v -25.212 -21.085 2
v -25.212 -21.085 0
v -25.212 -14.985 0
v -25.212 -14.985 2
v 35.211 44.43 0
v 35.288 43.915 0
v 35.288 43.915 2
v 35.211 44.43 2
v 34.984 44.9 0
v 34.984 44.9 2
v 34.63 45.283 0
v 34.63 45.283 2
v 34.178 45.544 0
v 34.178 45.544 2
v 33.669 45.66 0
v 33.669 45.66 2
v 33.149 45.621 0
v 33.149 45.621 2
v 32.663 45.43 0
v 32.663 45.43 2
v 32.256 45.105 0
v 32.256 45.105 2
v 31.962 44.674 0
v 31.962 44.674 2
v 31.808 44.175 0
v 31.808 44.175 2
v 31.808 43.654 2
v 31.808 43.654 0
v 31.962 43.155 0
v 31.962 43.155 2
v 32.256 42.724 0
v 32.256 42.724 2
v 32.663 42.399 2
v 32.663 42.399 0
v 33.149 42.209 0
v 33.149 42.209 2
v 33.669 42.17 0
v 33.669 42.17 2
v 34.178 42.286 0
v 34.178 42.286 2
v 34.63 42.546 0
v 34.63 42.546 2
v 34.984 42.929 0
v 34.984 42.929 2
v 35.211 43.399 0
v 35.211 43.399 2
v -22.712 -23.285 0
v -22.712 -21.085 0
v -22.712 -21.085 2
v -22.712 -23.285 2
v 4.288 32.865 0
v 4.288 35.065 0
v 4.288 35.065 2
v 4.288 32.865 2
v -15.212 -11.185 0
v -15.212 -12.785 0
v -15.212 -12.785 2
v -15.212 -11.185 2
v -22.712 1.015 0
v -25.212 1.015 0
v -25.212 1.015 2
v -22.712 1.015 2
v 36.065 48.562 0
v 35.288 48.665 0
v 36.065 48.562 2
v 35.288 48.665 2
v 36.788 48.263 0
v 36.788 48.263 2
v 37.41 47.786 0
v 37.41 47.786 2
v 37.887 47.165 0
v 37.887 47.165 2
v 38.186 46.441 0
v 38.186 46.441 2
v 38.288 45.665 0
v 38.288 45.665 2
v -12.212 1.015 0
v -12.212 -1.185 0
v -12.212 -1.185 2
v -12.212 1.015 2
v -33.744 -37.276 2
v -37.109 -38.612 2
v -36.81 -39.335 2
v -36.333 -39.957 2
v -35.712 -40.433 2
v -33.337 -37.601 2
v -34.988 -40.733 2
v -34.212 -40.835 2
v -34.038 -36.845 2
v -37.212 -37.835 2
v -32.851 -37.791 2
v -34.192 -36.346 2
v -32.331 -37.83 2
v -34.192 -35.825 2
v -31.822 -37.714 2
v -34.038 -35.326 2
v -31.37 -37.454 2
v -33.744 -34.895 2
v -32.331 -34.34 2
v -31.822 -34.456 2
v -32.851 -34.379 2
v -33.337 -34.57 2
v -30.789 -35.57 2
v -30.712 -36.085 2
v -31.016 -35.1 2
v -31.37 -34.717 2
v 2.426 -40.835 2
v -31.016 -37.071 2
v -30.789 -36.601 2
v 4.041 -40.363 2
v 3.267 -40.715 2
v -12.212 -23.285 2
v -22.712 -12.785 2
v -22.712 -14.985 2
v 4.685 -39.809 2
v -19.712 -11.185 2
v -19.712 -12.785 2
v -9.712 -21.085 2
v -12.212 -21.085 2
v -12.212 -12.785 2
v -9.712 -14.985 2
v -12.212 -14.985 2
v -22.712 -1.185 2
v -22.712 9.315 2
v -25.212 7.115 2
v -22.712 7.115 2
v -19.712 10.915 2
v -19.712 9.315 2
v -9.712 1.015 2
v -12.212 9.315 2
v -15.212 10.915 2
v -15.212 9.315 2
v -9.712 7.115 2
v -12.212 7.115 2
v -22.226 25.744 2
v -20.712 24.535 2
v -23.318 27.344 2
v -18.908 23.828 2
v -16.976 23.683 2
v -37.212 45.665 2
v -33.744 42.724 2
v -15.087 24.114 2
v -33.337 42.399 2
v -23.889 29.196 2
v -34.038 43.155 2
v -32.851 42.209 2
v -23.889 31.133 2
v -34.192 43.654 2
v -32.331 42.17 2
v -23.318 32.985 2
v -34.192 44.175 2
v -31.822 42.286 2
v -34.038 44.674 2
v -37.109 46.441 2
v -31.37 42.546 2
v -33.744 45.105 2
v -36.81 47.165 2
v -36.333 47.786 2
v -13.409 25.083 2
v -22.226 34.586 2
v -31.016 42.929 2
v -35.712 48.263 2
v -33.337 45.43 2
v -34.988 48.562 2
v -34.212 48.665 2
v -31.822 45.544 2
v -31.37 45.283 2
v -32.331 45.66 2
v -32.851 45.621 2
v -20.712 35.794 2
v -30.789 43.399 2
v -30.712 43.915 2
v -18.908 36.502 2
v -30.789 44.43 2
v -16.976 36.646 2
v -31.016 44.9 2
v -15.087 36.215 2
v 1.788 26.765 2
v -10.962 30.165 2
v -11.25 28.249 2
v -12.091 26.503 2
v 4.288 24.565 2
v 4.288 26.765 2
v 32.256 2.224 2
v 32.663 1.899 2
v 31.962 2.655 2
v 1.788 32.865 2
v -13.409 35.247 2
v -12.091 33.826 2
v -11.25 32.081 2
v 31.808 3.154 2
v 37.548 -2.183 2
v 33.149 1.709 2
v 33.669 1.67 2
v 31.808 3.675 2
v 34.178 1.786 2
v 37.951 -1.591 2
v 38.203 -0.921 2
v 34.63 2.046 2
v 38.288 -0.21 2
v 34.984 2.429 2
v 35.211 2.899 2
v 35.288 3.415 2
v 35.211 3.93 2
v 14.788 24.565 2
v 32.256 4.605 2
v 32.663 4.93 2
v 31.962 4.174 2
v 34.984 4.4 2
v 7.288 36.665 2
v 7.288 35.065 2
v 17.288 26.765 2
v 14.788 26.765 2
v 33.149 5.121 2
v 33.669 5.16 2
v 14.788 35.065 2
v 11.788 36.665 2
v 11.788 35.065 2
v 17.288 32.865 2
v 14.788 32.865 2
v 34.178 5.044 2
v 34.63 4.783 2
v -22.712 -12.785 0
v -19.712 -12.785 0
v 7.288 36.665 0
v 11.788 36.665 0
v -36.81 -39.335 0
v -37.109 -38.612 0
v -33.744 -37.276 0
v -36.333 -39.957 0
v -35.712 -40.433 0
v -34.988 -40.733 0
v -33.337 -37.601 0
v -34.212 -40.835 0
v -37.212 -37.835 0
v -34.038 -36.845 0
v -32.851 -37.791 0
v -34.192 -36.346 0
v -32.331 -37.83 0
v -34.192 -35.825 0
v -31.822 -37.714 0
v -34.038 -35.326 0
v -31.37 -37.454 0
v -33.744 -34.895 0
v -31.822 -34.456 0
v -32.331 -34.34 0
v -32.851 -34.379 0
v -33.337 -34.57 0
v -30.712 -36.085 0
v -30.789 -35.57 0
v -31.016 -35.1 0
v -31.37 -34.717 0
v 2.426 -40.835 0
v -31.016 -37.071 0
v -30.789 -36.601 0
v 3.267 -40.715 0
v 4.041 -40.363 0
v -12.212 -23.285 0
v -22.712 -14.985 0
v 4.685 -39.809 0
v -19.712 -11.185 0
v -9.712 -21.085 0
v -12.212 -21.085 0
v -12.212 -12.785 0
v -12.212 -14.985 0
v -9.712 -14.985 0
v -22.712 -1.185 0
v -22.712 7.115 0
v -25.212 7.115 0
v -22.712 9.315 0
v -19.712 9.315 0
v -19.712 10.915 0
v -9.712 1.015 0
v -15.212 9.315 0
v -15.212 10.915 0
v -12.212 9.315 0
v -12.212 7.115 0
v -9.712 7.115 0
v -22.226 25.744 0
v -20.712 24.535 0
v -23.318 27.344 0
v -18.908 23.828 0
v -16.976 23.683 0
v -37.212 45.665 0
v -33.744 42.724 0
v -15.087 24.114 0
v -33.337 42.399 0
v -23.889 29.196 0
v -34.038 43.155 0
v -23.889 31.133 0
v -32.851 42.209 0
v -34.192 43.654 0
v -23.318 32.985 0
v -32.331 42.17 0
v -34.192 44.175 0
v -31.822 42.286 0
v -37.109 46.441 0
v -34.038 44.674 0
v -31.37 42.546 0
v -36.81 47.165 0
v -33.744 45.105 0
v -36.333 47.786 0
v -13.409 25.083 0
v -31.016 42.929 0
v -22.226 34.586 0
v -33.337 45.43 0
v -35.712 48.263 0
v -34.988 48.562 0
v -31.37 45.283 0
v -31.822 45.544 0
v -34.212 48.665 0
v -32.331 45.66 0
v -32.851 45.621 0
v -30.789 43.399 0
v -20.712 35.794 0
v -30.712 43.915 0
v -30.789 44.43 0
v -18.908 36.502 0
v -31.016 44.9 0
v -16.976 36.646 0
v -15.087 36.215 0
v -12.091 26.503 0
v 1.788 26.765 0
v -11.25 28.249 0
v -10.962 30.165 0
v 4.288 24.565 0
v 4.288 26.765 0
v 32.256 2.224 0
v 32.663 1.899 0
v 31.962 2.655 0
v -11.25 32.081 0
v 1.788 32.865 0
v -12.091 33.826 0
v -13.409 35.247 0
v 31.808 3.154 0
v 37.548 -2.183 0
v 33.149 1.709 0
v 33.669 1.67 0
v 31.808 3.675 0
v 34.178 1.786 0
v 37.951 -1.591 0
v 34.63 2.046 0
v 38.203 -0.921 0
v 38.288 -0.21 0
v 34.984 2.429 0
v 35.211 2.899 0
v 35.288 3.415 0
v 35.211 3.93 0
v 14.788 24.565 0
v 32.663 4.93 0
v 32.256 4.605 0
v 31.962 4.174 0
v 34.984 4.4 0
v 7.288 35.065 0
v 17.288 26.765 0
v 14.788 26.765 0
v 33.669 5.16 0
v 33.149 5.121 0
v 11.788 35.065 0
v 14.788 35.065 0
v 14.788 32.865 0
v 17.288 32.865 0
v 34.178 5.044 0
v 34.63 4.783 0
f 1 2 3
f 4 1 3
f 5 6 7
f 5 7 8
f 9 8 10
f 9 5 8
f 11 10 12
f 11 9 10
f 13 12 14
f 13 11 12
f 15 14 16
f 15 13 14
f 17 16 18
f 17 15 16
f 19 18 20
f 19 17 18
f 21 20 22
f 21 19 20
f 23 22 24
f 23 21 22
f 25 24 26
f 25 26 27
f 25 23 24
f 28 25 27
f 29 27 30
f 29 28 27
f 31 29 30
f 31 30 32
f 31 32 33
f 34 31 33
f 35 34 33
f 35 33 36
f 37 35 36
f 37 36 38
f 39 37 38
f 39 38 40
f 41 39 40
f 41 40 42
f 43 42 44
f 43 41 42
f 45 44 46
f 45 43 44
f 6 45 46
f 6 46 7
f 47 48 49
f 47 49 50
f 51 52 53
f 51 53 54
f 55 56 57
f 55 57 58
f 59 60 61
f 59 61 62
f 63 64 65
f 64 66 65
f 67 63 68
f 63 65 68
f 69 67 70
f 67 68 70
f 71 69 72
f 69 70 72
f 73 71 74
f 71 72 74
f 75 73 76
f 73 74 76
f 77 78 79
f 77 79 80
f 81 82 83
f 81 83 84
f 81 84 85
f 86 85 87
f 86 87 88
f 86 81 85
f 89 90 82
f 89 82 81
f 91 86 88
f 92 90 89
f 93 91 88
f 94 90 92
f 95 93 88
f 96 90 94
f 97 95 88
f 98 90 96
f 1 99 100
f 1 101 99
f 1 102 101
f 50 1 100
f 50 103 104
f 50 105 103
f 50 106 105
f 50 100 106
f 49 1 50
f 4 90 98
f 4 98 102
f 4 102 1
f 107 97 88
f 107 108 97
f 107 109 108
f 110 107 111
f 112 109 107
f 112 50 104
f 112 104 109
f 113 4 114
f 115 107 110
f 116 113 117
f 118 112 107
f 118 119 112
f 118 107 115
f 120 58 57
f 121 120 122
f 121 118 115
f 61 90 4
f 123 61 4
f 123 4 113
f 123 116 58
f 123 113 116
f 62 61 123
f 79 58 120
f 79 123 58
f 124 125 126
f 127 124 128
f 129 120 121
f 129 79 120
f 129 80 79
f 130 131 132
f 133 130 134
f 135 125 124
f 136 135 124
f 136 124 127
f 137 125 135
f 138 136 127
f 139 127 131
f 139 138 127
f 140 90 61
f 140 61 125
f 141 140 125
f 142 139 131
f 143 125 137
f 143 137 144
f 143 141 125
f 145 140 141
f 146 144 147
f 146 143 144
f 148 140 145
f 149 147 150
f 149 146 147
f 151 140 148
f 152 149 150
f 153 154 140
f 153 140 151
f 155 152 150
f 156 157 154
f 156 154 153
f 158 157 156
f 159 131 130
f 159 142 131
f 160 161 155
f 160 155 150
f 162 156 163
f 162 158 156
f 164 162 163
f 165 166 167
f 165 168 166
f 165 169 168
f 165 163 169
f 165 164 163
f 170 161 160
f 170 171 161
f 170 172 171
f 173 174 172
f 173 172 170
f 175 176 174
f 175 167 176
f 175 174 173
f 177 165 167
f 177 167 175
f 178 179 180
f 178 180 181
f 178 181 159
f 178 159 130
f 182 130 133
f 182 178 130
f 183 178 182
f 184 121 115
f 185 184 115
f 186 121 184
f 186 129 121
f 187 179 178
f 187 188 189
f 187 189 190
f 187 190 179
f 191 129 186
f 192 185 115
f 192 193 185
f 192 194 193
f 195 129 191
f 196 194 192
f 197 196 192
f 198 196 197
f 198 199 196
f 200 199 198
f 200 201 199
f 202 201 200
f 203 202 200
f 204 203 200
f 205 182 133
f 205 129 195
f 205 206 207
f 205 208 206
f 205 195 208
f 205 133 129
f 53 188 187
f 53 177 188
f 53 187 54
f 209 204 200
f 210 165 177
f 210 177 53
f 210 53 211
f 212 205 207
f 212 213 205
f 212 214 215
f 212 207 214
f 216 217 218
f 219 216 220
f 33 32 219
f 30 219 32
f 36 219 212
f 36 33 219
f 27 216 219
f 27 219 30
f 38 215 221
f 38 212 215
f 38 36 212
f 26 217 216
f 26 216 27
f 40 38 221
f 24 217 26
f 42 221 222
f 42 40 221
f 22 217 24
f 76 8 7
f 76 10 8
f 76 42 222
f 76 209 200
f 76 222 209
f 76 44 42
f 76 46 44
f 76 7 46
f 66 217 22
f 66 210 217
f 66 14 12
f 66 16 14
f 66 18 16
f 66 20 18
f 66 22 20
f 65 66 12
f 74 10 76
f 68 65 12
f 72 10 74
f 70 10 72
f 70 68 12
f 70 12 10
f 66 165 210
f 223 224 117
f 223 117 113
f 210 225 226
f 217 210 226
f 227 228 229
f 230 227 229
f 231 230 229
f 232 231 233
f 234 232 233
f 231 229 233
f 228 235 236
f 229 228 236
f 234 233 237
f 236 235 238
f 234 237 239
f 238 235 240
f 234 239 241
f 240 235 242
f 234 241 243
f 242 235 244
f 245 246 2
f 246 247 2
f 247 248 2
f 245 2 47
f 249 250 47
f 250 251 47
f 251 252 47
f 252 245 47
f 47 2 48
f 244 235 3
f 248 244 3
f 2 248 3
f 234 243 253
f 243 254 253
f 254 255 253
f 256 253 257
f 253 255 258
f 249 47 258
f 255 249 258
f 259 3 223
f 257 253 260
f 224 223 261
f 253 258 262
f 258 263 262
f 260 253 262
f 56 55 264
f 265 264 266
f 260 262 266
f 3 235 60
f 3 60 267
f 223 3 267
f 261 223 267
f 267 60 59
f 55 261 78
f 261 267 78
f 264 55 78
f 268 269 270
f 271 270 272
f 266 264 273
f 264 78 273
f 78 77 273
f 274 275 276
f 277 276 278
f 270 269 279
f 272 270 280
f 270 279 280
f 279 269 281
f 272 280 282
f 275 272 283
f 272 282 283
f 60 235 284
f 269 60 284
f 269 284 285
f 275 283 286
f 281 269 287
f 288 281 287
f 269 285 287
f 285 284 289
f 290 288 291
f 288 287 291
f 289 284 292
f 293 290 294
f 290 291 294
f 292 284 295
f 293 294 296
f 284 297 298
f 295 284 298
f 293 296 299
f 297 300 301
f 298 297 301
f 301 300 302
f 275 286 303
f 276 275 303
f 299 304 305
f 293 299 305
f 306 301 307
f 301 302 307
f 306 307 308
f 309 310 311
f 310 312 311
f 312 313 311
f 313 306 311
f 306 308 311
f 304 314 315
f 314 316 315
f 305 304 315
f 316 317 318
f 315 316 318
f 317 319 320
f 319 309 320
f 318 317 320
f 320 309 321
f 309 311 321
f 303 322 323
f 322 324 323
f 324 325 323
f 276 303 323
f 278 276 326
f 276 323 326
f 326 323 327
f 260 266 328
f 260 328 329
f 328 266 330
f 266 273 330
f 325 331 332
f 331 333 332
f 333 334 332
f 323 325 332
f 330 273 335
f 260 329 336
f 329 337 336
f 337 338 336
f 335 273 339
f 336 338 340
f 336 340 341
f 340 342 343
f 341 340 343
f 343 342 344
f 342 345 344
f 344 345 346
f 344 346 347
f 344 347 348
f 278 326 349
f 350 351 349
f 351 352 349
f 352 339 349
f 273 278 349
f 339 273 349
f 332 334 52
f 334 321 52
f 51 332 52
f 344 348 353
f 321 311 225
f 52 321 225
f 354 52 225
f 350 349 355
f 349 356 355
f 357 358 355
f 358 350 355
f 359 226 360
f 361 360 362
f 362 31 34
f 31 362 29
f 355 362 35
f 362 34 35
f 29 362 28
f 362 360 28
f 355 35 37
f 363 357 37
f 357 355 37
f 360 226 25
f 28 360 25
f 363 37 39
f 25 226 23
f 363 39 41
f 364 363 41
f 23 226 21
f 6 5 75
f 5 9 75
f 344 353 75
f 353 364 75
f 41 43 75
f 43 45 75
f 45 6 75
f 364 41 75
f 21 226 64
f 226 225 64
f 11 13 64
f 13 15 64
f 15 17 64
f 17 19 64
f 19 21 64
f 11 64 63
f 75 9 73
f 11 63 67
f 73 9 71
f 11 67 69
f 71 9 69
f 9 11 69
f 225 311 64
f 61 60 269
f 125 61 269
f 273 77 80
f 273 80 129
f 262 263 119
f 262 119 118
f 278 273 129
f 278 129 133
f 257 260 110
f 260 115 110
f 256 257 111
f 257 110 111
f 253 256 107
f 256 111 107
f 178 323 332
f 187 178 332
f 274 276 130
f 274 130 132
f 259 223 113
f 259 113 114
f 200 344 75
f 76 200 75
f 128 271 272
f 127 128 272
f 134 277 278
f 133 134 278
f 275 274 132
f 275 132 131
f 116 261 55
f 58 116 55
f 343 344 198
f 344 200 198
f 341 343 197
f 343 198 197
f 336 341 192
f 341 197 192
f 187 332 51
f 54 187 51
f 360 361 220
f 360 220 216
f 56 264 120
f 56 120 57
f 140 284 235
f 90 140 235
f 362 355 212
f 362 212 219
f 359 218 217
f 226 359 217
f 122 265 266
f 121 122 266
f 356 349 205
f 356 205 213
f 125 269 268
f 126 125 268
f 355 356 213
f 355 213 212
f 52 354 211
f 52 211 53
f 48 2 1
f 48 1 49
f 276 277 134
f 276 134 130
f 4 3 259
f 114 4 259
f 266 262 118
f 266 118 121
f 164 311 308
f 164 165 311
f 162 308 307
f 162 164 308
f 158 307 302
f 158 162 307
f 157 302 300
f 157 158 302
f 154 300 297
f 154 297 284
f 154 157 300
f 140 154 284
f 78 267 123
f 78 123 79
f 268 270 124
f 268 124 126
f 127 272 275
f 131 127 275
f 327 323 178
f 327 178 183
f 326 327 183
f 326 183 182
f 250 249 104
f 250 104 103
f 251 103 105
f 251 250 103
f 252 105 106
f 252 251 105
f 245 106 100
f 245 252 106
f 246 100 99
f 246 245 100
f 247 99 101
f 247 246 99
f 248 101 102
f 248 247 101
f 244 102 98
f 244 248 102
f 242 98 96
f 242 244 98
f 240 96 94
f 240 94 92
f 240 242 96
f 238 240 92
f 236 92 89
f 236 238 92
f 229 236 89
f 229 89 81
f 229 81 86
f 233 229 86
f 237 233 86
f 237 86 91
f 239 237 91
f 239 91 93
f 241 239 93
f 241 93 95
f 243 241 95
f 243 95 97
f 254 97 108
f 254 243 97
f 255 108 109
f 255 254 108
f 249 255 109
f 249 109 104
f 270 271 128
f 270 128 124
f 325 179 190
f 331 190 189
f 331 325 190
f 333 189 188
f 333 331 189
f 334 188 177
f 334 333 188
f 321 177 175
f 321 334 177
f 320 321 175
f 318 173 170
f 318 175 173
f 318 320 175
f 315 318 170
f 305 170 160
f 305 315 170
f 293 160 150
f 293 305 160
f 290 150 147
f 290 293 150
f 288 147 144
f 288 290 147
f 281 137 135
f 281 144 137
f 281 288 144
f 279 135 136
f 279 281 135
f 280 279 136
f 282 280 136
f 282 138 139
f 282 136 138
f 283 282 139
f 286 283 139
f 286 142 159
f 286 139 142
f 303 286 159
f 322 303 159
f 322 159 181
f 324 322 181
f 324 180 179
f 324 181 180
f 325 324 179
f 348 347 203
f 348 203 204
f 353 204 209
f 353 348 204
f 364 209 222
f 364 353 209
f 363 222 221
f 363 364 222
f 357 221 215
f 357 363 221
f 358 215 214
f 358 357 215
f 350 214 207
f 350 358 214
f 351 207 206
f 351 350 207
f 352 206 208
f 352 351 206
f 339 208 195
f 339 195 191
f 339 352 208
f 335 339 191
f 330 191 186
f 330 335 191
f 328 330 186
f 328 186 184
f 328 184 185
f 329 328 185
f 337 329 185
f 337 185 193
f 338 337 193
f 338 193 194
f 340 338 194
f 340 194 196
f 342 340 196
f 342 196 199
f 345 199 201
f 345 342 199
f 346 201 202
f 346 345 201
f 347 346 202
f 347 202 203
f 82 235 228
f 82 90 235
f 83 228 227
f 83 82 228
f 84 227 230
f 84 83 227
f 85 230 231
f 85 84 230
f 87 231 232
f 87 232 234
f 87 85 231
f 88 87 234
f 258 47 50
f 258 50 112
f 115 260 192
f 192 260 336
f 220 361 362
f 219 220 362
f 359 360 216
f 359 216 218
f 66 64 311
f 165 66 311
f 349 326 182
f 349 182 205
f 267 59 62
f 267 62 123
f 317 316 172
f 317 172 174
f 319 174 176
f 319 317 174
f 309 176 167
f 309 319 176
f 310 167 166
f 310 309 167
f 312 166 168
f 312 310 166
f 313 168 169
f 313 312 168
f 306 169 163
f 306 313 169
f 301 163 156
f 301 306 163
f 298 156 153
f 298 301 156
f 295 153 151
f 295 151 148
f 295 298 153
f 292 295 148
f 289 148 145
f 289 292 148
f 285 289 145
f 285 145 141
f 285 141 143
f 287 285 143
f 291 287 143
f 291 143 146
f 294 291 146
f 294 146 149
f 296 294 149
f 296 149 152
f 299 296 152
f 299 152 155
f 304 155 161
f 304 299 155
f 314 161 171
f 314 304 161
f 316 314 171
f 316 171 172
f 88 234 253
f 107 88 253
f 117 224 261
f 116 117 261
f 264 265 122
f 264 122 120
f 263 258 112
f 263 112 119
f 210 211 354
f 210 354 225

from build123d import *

# Parameters (mm, degrees)
F0_R     = 1.75
F2_DEPTH = 2
F1_W     = 4.5
F1_H     = 1.6
F1_W_2   = 2.5
F1_H_2   = 6.1
F1_R     = 6.5
F3_DEPTH = 2.001
F4_R     = 3


with BuildPart() as f2:
    # F0 (on Top) → F2 (new body)
    with BuildSketch(Plane.XY):
        Polygon((38.288459, 48.664646), (-37.211541, 48.664646), (-37.211541, -40.835354), (3.788459, -40.835354), (38.288459, -1.335354), align=None)
        with Locations((-32.461541, -36.085354)):
            Circle(F0_R, mode=Mode.SUBTRACT)
        with Locations((33.538459, 3.414646)):
            Circle(F0_R, mode=Mode.SUBTRACT)
        with Locations((-32.461541, 43.914646)):
            Circle(F0_R, mode=Mode.SUBTRACT)
        with Locations((33.538459, 43.914646)):
            Circle(F0_R, mode=Mode.SUBTRACT)
    extrude(amount=F2_DEPTH)

    # F1 (on Top) → F3 (cut, through all)
    with BuildSketch(Plane.XY):
        Polygon((-12.211541, 7.114646), (-12.211541, 9.314646), (-15.211541, 9.314646), (-19.711541, 9.314646), (-22.711541, 9.314646), (-22.711541, 7.114646), (-22.711541, 1.014646), (-22.711541, -1.185354), (-12.211541, -1.185354), (-12.211541, 1.014646), align=None)
        with Locations((-17.461541, 10.114646)):
            Rectangle(F1_W, F1_H)
        with Locations((-10.961541, 4.064646)):
            Rectangle(F1_W_2, F1_H_2)
        with Locations((-23.961541, 4.064646)):
            Rectangle(F1_W_2, F1_H_2)
        Polygon((14.788459, 32.864646), (14.788459, 35.064646), (11.788459, 35.064646), (7.288459, 35.064646), (4.288459, 35.064646), (4.288459, 32.864646), (4.288459, 26.764646), (4.288459, 24.564646), (14.788459, 24.564646), (14.788459, 26.764646), align=None)
        with Locations((9.538459, 35.864646)):
            Rectangle(F1_W, F1_H)
        with Locations((16.038459, 29.814646)):
            Rectangle(F1_W_2, F1_H_2)
        with Locations((3.038459, 29.814646)):
            Rectangle(F1_W_2, F1_H_2)
        Polygon((-12.211541, -14.985354), (-12.211541, -12.785354), (-15.211541, -12.785354), (-19.711541, -12.785354), (-22.711541, -12.785354), (-22.711541, -14.985354), (-22.711541, -21.085354), (-22.711541, -23.285354), (-12.211541, -23.285354), (-12.211541, -21.085354), align=None)
        with Locations((-17.461541, -11.985354)):
            Rectangle(F1_W, F1_H)
        with Locations((-10.961541, -18.035354)):
            Rectangle(F1_W_2, F1_H_2)
        with Locations((-23.961541, -18.035354)):
            Rectangle(F1_W_2, F1_H_2)
        with Locations((-17.461541, 30.164646)):
            Circle(F1_R)
    extrude(amount=F3_DEPTH, mode=Mode.SUBTRACT)

    # F4
    f4_edges = [f2.edges().sort_by_distance(p)[0] for p in [
        (-37.211541, 48.664646, 1),
        (38.288459, 48.664646, 1),
        (38.288459, -1.335354, 1),
        (3.788459, -40.835354, 1),
        (-37.211541, -40.835354, 1),
    ]]
    fillet(f4_edges, radius=F4_R)


solid = f2.part
